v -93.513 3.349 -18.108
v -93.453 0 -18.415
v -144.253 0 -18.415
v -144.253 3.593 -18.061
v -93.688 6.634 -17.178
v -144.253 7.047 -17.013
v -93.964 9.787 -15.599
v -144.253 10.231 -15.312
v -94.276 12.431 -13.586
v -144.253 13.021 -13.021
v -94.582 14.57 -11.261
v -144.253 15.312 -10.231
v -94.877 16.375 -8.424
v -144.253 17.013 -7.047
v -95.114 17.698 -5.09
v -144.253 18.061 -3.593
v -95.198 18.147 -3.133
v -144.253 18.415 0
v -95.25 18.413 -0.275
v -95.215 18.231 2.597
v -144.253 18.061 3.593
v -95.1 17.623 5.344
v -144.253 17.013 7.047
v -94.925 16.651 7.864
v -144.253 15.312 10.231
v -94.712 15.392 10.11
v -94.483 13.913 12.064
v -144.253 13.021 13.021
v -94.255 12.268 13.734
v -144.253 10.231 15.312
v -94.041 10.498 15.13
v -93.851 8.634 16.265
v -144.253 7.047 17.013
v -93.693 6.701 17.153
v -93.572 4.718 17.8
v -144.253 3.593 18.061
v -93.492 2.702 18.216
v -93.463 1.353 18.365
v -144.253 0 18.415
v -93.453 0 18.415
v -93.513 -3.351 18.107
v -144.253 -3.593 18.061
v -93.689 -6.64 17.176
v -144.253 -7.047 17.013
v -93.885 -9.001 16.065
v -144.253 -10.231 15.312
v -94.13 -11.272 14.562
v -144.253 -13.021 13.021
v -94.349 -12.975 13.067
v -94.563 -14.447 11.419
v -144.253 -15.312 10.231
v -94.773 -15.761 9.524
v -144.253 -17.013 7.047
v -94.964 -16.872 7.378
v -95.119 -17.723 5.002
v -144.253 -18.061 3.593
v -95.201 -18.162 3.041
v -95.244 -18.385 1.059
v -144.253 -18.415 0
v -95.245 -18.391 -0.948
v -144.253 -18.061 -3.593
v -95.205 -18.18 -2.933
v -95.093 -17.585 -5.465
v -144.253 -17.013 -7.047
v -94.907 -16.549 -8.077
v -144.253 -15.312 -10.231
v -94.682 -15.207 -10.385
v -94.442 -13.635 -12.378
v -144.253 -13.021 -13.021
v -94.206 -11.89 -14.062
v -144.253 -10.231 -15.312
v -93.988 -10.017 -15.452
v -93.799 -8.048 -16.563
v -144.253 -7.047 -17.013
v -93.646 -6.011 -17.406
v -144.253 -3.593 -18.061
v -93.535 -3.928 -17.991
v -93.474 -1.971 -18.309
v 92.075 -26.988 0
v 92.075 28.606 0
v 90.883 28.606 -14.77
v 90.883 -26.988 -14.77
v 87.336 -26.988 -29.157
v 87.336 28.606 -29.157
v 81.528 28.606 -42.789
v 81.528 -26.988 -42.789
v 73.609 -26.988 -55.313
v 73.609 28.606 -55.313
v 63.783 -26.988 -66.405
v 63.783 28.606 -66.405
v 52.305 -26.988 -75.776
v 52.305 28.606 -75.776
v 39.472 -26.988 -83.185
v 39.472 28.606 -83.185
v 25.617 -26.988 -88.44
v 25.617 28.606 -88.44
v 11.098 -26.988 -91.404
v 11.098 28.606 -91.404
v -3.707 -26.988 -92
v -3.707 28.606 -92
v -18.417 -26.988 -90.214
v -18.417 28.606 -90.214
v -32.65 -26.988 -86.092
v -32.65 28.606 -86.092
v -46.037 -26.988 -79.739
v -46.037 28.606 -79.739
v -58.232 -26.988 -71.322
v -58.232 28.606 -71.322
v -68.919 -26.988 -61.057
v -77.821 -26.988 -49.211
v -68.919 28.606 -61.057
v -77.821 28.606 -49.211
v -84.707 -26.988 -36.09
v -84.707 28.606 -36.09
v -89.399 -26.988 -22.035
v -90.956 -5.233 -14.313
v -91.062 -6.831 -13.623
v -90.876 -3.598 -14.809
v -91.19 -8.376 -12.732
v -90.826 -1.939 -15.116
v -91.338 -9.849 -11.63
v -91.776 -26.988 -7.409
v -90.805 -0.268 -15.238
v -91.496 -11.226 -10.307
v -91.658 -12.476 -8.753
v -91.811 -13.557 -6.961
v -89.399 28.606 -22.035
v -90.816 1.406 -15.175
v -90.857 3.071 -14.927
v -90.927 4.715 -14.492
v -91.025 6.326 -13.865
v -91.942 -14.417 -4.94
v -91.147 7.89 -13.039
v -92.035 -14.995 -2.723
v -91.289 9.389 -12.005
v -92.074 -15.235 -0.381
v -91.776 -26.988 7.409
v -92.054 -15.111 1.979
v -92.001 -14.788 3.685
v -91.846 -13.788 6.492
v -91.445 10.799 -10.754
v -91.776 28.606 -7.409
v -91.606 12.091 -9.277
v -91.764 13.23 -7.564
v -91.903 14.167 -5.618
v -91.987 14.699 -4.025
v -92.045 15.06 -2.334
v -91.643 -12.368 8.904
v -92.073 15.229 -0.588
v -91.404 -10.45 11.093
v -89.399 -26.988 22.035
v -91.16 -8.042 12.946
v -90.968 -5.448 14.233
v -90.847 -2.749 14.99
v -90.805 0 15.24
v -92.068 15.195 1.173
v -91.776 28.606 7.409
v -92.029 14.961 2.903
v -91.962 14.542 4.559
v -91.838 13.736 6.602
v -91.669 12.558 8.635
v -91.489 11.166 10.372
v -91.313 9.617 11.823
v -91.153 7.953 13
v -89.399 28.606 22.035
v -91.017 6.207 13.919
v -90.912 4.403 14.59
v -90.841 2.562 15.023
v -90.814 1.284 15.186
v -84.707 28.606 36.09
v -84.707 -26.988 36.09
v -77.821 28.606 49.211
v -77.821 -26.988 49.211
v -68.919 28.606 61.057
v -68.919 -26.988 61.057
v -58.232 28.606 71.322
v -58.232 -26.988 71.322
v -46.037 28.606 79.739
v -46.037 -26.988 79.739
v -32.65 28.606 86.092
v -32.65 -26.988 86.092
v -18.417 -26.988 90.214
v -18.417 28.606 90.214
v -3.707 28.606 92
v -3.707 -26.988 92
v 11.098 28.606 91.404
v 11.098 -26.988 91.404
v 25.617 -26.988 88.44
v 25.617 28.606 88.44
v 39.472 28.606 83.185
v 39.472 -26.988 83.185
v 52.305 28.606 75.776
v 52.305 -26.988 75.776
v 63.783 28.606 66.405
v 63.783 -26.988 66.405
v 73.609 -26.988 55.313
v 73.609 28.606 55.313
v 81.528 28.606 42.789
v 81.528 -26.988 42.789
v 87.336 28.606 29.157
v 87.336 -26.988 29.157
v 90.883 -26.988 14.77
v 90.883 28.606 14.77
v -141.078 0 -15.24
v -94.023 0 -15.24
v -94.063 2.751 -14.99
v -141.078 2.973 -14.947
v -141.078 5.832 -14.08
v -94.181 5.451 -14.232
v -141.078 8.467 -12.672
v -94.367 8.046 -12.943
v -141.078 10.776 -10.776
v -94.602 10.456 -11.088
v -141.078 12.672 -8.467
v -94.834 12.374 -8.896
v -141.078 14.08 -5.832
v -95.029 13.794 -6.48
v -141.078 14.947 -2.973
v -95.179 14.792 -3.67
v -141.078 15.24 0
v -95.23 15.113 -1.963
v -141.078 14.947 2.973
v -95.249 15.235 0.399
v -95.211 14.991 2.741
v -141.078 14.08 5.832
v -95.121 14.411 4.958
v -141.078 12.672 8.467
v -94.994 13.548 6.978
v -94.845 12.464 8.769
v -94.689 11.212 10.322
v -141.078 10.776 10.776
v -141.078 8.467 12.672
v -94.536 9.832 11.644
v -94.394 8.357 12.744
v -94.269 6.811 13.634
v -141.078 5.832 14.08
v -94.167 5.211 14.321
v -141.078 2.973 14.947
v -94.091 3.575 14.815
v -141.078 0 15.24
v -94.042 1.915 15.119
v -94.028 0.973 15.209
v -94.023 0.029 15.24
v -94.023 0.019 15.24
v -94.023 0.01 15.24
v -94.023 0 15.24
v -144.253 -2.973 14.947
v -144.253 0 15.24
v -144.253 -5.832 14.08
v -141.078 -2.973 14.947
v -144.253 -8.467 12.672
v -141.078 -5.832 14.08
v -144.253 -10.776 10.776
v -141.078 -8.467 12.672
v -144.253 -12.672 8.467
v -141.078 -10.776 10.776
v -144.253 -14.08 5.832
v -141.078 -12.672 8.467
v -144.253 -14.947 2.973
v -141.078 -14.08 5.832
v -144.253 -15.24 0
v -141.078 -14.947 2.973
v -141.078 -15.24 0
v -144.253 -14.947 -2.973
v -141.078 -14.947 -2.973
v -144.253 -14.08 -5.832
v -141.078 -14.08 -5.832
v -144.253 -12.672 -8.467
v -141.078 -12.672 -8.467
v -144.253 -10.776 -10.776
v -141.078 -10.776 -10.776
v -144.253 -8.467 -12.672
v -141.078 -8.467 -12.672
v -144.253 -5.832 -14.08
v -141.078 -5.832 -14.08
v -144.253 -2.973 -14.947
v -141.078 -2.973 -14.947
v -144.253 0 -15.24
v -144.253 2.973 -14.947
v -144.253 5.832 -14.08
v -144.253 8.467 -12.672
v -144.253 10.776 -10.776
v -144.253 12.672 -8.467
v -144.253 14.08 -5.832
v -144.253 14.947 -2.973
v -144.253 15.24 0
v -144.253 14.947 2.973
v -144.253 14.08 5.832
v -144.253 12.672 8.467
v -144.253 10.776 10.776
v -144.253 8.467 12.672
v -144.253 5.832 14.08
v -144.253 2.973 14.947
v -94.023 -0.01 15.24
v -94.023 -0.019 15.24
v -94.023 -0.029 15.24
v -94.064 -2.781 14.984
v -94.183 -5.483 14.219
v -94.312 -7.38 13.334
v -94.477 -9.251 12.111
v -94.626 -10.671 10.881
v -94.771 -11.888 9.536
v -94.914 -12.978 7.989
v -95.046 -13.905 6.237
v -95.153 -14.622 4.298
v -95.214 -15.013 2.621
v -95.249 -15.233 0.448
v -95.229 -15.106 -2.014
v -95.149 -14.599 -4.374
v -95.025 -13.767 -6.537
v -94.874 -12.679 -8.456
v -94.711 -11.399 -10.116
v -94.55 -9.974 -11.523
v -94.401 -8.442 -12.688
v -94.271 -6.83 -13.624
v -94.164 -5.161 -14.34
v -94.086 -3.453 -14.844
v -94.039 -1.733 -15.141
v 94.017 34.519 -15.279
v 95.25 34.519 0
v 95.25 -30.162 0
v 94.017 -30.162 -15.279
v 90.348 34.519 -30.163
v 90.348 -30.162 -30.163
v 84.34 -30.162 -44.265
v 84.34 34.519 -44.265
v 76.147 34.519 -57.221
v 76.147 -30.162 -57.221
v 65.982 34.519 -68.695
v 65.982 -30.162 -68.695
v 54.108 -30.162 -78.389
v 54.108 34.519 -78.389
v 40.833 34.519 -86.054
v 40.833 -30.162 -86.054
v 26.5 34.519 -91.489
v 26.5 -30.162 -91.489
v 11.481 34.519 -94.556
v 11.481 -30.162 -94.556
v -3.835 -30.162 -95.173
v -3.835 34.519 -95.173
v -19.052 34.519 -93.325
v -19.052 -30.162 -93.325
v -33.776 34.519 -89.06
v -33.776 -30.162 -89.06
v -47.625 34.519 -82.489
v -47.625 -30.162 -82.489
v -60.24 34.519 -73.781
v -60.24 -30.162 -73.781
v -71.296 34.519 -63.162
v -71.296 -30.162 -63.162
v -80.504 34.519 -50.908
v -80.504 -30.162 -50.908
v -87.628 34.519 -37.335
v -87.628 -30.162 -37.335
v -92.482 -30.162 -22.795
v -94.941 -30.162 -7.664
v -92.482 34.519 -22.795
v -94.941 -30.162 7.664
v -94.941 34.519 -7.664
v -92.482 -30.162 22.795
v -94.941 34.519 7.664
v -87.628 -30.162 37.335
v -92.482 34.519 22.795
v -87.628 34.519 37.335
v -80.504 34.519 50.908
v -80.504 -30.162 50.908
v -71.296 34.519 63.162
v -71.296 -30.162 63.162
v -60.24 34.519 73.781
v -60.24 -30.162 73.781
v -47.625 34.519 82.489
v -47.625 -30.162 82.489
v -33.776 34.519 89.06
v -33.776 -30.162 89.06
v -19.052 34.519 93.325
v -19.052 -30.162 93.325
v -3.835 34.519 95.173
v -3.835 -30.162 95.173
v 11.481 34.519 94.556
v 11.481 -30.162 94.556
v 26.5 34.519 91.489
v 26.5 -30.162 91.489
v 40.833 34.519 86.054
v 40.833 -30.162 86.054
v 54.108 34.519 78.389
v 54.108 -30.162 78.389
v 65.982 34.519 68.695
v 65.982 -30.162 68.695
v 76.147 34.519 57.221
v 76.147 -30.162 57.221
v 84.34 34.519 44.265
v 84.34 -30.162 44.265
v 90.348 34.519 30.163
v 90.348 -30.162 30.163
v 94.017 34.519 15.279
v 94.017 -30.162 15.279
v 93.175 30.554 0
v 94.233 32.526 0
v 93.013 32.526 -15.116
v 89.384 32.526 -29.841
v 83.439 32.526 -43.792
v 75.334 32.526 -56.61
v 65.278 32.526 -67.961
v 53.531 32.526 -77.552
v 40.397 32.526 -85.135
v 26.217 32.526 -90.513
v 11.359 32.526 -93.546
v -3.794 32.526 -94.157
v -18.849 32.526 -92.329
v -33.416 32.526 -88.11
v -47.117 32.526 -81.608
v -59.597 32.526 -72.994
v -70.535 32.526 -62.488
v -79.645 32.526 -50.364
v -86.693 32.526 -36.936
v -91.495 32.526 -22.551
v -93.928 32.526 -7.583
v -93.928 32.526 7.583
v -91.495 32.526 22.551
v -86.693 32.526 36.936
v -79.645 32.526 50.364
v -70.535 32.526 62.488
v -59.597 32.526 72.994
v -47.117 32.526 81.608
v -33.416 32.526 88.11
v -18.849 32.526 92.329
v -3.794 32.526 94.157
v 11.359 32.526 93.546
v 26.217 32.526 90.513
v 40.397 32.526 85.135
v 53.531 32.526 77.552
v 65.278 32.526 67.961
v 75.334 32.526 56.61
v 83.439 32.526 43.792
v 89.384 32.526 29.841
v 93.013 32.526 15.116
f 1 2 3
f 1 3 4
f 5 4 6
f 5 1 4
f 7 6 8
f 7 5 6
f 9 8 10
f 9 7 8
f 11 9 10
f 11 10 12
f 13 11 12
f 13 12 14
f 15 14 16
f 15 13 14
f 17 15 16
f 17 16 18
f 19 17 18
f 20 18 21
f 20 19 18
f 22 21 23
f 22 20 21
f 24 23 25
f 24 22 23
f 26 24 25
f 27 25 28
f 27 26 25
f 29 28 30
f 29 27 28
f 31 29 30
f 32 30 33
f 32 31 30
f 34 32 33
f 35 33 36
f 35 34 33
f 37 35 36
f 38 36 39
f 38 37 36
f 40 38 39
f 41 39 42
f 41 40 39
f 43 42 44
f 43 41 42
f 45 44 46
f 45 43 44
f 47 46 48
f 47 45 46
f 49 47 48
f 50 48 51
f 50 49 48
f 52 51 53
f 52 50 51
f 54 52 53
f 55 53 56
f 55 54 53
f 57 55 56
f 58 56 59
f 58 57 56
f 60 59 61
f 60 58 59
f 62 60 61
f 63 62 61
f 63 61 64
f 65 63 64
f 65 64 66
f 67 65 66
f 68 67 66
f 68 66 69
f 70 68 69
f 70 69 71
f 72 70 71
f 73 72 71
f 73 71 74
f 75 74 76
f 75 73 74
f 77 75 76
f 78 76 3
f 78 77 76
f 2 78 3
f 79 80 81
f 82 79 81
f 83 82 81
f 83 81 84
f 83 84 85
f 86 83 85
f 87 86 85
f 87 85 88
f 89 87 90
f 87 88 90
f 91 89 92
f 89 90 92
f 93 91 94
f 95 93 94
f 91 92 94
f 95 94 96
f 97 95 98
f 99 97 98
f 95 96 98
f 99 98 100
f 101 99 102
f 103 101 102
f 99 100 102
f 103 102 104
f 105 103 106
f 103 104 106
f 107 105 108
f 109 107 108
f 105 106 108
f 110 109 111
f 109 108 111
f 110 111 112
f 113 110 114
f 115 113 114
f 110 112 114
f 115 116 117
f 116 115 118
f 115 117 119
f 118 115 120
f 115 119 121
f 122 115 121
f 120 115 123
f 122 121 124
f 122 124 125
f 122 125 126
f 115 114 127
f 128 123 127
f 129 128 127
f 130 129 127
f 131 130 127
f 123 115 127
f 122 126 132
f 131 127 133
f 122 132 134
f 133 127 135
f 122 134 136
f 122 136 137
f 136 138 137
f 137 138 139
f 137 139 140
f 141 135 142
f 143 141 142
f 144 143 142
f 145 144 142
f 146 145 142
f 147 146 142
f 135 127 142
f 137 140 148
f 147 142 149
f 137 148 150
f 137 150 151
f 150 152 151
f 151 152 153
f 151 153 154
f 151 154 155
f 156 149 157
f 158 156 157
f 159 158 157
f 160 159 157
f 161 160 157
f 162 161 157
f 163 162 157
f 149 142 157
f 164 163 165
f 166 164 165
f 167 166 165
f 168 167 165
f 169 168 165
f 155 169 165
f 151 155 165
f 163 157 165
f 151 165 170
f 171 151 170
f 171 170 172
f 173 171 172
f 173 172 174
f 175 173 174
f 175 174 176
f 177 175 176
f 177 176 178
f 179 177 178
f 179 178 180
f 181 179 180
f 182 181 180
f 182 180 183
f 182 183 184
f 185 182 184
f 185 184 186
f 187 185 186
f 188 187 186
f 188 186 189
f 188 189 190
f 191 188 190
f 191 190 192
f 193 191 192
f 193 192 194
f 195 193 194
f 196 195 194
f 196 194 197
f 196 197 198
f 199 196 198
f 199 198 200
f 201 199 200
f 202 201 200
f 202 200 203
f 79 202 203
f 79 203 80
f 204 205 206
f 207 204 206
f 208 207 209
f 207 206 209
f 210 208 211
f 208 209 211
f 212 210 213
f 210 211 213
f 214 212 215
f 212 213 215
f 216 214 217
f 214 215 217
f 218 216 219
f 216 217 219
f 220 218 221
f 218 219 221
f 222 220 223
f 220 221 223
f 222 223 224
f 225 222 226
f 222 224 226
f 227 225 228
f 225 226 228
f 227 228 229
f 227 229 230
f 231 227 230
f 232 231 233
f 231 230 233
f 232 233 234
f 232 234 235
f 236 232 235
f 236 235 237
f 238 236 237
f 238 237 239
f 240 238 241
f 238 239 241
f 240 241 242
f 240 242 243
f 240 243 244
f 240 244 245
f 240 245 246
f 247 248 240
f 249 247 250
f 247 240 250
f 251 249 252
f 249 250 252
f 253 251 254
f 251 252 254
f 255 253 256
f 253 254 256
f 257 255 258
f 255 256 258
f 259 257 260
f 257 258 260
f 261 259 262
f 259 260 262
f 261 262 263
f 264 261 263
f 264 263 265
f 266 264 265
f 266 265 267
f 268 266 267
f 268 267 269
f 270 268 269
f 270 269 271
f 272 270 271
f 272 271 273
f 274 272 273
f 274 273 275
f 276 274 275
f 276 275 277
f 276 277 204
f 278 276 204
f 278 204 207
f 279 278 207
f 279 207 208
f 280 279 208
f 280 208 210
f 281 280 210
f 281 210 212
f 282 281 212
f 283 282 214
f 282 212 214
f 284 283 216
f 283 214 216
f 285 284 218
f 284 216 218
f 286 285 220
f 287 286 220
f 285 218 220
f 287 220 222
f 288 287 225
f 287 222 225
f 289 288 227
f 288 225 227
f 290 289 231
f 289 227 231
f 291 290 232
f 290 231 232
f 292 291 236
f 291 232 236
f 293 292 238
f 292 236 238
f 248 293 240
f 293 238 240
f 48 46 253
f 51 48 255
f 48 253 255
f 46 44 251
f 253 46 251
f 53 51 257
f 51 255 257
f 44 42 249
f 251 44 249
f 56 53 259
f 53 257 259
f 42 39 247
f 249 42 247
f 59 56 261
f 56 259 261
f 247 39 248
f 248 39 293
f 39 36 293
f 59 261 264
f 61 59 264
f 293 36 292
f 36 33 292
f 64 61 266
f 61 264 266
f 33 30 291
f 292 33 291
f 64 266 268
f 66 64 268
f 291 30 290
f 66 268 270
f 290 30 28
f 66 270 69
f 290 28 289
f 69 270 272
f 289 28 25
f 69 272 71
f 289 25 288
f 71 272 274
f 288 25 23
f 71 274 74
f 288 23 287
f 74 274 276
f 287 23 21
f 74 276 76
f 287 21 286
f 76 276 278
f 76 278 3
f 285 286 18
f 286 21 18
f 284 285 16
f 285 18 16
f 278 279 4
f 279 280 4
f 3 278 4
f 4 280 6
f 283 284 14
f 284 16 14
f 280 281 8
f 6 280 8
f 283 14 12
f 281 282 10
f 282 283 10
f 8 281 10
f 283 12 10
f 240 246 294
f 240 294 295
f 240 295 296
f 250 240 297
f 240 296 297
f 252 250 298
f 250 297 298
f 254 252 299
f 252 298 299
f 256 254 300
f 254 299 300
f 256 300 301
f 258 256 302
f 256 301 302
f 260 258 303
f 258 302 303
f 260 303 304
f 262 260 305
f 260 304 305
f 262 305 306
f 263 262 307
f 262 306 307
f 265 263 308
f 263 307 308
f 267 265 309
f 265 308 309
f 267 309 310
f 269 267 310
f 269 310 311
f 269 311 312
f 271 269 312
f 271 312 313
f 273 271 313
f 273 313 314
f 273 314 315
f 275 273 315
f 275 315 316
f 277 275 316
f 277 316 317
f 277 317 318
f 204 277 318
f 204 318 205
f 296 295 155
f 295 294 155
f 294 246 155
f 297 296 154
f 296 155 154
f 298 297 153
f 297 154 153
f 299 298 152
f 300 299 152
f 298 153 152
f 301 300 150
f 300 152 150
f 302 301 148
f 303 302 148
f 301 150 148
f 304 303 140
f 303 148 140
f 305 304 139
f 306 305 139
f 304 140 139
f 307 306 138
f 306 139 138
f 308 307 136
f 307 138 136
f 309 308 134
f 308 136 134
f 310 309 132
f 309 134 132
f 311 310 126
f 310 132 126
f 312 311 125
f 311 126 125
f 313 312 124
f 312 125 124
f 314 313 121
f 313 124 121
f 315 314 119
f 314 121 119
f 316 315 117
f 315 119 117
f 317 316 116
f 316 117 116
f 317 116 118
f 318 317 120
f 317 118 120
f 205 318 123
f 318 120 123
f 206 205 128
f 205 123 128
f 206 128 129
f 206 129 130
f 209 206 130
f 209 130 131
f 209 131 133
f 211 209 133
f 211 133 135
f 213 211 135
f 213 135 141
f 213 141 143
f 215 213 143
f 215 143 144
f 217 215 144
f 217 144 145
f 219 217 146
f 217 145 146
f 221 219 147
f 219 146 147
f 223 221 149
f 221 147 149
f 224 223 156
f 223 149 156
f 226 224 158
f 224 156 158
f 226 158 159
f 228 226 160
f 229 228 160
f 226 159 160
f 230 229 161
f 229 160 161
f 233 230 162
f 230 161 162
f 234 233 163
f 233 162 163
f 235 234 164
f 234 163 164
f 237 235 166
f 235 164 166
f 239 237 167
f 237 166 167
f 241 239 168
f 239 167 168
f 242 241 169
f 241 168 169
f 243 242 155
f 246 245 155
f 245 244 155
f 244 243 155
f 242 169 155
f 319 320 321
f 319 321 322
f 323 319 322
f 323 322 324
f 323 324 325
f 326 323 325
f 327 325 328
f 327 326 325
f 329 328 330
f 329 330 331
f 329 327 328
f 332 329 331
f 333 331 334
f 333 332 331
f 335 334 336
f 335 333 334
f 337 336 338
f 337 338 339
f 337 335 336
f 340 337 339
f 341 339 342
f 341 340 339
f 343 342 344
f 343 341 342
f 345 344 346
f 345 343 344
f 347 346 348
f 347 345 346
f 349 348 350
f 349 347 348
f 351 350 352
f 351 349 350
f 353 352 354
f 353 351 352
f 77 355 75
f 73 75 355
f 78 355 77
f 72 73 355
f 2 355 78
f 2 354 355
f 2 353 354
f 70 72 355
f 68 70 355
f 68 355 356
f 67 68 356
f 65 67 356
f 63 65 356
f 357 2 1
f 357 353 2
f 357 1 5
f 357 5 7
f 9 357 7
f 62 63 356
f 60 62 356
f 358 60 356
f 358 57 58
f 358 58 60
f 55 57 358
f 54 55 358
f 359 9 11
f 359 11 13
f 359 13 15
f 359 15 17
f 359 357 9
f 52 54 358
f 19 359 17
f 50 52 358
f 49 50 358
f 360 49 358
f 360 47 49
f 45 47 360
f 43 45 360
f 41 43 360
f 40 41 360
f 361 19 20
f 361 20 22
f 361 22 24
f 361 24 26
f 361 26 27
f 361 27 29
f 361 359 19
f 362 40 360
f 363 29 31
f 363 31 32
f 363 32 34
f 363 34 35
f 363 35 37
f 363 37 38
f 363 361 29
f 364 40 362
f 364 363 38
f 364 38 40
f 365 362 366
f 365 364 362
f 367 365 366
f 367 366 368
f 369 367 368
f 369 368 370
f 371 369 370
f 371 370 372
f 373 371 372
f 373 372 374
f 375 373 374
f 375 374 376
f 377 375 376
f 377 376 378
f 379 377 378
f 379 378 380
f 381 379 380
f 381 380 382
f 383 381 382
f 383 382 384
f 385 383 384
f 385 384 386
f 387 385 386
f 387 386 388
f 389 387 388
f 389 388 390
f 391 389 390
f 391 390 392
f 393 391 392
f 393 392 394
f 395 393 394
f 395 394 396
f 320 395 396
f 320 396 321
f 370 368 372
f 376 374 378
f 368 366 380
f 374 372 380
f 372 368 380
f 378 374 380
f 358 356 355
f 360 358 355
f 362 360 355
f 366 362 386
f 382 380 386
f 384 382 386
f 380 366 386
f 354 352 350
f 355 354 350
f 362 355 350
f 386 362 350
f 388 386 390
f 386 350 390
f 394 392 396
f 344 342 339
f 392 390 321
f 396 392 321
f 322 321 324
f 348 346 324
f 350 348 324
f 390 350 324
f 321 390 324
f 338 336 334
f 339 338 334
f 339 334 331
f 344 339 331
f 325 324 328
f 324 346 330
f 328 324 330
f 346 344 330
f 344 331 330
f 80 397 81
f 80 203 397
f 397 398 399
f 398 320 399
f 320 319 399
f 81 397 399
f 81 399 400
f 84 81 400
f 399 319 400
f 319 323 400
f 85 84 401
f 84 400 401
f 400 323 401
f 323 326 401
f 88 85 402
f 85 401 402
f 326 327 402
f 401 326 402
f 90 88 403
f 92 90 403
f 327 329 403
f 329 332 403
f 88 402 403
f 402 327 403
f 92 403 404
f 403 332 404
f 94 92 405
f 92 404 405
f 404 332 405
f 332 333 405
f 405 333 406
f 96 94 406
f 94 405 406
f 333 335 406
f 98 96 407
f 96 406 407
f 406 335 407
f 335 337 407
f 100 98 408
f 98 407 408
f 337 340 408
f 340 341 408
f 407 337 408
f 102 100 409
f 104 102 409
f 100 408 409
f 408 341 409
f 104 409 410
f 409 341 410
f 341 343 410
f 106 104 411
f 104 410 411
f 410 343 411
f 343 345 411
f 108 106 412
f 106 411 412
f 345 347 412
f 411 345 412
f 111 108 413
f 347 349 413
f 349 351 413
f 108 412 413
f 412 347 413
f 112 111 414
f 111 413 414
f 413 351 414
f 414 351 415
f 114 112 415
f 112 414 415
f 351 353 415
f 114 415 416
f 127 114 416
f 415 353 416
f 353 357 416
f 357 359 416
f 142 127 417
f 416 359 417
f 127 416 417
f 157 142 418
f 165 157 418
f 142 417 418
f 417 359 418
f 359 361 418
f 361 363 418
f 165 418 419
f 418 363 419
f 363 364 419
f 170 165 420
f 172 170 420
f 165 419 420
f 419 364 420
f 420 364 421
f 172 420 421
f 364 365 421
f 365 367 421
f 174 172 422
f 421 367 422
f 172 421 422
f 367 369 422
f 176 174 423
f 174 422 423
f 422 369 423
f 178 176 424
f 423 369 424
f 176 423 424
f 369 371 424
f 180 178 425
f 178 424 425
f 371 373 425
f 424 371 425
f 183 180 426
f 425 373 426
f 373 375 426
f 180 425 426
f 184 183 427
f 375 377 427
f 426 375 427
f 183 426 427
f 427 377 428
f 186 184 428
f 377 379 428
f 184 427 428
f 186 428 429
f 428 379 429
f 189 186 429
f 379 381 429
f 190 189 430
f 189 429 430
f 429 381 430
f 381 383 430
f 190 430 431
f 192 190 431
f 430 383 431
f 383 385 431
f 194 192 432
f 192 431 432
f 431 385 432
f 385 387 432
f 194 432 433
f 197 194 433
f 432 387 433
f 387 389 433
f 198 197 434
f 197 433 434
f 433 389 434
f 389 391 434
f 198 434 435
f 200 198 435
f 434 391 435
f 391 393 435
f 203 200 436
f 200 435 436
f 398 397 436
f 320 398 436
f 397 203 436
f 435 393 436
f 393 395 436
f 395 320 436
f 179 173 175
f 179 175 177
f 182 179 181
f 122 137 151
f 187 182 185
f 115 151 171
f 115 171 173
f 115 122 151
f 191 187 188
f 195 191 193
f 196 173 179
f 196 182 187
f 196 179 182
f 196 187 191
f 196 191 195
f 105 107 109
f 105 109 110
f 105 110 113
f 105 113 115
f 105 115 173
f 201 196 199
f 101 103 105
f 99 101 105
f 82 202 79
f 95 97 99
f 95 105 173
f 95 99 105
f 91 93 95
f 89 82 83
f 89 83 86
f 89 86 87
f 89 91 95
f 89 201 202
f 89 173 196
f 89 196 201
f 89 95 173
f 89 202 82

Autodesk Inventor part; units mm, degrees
ref_plane "YZ Plane" through (0, 0, 0) normal (1, 0, 0) x (0, 1, 0)
ref_plane "XZ Plane" through (0, 0, 0) normal (0, 1, 0) x (-1, 0, 0)
ref_plane "XY Plane" through (0, 0, 0) normal (0, 0, 1) x (1, 0, 0)
sketch "Sketch1" plane through (0, 0, 0) normal (0, 0, 1) x (1, 0, 0)
  line L0 (87.9882, 31.75) -> (89.8166, 31.75)
  line L1 (0, 0) -> (0, -1.5875)
  line L2 (0, -30.1625) -> (95.25, -30.1625)
  line L3 (0, -30.1625) -> (0, -26.9875)
  line L4 (95.25, -30.1625) -> (95.25, 34.519)
  line L5 (0, -26.9875) -> (92.075, -26.9875)
  line L6 (92.075, -26.9875) -> (92.075, 28.6057)
  arc A0 (92.075, 28.6057) -> (95.25, 34.519) centre (0, 81.8521) ccw
  dimension "d11" = 31.75
  dimension "d52" = 95.25
  dimension "d53" = 3.175
  dimension "d55" = 3.175
  dimension "d56" = 106.3625
revolve "Revolution4" add sketch "Sketch1" angle 360 about axis through (0, -30.1625, 0) along (0, 1, 0)
sketch "Sketch15" plane through (0, 0, 0) normal (0, 1, 0) x (-1, 0, 0)
  line L0 (144.2529, 0) -> (144.2529, -18.415)
  circle A0 centre (0, 0) radius 95.25 projected
  line L1 (144.2529, -18.415) -> (93.4529, -18.415)
  line L2 (144.2529, 0) -> (141.0779, 0)
  line L3 (141.0779, 0) -> (141.0779, -15.24)
  line L4 (141.0779, -15.24) -> (94.0229, -15.24)
  point P0 (0, 0)
  dimension "d58" = 3.175
  dimension "d59" = 15.24
  dimension "d60" = 3.175
  dimension "d61" = 50.8
revolve "Revolution5" add sketch "Sketch15" angle 360 about axis through (-144.2529, 0, 0) along (1, 0, 0) contours L0 L1 A0 L4 L3 L2
sketch "Sketch17" plane through (-144.2529, 0, 0) normal (-1, 0, 0) x (0, 0, 1)
  circle A0 centre (0, 0) radius 18.415 projected
hole "Hole5" at (-144.2529, 0, 0) direction (1, 0, 0) diameter 30.48 depth 127 tip angle 118
sketch "Sketch18" plane through (-144.2529, 0, 0) normal (-1, 0, 0) x (0, 0, 1)
  point P0 (0, 0)
properties part number "low_profile_noiseAttachment"
